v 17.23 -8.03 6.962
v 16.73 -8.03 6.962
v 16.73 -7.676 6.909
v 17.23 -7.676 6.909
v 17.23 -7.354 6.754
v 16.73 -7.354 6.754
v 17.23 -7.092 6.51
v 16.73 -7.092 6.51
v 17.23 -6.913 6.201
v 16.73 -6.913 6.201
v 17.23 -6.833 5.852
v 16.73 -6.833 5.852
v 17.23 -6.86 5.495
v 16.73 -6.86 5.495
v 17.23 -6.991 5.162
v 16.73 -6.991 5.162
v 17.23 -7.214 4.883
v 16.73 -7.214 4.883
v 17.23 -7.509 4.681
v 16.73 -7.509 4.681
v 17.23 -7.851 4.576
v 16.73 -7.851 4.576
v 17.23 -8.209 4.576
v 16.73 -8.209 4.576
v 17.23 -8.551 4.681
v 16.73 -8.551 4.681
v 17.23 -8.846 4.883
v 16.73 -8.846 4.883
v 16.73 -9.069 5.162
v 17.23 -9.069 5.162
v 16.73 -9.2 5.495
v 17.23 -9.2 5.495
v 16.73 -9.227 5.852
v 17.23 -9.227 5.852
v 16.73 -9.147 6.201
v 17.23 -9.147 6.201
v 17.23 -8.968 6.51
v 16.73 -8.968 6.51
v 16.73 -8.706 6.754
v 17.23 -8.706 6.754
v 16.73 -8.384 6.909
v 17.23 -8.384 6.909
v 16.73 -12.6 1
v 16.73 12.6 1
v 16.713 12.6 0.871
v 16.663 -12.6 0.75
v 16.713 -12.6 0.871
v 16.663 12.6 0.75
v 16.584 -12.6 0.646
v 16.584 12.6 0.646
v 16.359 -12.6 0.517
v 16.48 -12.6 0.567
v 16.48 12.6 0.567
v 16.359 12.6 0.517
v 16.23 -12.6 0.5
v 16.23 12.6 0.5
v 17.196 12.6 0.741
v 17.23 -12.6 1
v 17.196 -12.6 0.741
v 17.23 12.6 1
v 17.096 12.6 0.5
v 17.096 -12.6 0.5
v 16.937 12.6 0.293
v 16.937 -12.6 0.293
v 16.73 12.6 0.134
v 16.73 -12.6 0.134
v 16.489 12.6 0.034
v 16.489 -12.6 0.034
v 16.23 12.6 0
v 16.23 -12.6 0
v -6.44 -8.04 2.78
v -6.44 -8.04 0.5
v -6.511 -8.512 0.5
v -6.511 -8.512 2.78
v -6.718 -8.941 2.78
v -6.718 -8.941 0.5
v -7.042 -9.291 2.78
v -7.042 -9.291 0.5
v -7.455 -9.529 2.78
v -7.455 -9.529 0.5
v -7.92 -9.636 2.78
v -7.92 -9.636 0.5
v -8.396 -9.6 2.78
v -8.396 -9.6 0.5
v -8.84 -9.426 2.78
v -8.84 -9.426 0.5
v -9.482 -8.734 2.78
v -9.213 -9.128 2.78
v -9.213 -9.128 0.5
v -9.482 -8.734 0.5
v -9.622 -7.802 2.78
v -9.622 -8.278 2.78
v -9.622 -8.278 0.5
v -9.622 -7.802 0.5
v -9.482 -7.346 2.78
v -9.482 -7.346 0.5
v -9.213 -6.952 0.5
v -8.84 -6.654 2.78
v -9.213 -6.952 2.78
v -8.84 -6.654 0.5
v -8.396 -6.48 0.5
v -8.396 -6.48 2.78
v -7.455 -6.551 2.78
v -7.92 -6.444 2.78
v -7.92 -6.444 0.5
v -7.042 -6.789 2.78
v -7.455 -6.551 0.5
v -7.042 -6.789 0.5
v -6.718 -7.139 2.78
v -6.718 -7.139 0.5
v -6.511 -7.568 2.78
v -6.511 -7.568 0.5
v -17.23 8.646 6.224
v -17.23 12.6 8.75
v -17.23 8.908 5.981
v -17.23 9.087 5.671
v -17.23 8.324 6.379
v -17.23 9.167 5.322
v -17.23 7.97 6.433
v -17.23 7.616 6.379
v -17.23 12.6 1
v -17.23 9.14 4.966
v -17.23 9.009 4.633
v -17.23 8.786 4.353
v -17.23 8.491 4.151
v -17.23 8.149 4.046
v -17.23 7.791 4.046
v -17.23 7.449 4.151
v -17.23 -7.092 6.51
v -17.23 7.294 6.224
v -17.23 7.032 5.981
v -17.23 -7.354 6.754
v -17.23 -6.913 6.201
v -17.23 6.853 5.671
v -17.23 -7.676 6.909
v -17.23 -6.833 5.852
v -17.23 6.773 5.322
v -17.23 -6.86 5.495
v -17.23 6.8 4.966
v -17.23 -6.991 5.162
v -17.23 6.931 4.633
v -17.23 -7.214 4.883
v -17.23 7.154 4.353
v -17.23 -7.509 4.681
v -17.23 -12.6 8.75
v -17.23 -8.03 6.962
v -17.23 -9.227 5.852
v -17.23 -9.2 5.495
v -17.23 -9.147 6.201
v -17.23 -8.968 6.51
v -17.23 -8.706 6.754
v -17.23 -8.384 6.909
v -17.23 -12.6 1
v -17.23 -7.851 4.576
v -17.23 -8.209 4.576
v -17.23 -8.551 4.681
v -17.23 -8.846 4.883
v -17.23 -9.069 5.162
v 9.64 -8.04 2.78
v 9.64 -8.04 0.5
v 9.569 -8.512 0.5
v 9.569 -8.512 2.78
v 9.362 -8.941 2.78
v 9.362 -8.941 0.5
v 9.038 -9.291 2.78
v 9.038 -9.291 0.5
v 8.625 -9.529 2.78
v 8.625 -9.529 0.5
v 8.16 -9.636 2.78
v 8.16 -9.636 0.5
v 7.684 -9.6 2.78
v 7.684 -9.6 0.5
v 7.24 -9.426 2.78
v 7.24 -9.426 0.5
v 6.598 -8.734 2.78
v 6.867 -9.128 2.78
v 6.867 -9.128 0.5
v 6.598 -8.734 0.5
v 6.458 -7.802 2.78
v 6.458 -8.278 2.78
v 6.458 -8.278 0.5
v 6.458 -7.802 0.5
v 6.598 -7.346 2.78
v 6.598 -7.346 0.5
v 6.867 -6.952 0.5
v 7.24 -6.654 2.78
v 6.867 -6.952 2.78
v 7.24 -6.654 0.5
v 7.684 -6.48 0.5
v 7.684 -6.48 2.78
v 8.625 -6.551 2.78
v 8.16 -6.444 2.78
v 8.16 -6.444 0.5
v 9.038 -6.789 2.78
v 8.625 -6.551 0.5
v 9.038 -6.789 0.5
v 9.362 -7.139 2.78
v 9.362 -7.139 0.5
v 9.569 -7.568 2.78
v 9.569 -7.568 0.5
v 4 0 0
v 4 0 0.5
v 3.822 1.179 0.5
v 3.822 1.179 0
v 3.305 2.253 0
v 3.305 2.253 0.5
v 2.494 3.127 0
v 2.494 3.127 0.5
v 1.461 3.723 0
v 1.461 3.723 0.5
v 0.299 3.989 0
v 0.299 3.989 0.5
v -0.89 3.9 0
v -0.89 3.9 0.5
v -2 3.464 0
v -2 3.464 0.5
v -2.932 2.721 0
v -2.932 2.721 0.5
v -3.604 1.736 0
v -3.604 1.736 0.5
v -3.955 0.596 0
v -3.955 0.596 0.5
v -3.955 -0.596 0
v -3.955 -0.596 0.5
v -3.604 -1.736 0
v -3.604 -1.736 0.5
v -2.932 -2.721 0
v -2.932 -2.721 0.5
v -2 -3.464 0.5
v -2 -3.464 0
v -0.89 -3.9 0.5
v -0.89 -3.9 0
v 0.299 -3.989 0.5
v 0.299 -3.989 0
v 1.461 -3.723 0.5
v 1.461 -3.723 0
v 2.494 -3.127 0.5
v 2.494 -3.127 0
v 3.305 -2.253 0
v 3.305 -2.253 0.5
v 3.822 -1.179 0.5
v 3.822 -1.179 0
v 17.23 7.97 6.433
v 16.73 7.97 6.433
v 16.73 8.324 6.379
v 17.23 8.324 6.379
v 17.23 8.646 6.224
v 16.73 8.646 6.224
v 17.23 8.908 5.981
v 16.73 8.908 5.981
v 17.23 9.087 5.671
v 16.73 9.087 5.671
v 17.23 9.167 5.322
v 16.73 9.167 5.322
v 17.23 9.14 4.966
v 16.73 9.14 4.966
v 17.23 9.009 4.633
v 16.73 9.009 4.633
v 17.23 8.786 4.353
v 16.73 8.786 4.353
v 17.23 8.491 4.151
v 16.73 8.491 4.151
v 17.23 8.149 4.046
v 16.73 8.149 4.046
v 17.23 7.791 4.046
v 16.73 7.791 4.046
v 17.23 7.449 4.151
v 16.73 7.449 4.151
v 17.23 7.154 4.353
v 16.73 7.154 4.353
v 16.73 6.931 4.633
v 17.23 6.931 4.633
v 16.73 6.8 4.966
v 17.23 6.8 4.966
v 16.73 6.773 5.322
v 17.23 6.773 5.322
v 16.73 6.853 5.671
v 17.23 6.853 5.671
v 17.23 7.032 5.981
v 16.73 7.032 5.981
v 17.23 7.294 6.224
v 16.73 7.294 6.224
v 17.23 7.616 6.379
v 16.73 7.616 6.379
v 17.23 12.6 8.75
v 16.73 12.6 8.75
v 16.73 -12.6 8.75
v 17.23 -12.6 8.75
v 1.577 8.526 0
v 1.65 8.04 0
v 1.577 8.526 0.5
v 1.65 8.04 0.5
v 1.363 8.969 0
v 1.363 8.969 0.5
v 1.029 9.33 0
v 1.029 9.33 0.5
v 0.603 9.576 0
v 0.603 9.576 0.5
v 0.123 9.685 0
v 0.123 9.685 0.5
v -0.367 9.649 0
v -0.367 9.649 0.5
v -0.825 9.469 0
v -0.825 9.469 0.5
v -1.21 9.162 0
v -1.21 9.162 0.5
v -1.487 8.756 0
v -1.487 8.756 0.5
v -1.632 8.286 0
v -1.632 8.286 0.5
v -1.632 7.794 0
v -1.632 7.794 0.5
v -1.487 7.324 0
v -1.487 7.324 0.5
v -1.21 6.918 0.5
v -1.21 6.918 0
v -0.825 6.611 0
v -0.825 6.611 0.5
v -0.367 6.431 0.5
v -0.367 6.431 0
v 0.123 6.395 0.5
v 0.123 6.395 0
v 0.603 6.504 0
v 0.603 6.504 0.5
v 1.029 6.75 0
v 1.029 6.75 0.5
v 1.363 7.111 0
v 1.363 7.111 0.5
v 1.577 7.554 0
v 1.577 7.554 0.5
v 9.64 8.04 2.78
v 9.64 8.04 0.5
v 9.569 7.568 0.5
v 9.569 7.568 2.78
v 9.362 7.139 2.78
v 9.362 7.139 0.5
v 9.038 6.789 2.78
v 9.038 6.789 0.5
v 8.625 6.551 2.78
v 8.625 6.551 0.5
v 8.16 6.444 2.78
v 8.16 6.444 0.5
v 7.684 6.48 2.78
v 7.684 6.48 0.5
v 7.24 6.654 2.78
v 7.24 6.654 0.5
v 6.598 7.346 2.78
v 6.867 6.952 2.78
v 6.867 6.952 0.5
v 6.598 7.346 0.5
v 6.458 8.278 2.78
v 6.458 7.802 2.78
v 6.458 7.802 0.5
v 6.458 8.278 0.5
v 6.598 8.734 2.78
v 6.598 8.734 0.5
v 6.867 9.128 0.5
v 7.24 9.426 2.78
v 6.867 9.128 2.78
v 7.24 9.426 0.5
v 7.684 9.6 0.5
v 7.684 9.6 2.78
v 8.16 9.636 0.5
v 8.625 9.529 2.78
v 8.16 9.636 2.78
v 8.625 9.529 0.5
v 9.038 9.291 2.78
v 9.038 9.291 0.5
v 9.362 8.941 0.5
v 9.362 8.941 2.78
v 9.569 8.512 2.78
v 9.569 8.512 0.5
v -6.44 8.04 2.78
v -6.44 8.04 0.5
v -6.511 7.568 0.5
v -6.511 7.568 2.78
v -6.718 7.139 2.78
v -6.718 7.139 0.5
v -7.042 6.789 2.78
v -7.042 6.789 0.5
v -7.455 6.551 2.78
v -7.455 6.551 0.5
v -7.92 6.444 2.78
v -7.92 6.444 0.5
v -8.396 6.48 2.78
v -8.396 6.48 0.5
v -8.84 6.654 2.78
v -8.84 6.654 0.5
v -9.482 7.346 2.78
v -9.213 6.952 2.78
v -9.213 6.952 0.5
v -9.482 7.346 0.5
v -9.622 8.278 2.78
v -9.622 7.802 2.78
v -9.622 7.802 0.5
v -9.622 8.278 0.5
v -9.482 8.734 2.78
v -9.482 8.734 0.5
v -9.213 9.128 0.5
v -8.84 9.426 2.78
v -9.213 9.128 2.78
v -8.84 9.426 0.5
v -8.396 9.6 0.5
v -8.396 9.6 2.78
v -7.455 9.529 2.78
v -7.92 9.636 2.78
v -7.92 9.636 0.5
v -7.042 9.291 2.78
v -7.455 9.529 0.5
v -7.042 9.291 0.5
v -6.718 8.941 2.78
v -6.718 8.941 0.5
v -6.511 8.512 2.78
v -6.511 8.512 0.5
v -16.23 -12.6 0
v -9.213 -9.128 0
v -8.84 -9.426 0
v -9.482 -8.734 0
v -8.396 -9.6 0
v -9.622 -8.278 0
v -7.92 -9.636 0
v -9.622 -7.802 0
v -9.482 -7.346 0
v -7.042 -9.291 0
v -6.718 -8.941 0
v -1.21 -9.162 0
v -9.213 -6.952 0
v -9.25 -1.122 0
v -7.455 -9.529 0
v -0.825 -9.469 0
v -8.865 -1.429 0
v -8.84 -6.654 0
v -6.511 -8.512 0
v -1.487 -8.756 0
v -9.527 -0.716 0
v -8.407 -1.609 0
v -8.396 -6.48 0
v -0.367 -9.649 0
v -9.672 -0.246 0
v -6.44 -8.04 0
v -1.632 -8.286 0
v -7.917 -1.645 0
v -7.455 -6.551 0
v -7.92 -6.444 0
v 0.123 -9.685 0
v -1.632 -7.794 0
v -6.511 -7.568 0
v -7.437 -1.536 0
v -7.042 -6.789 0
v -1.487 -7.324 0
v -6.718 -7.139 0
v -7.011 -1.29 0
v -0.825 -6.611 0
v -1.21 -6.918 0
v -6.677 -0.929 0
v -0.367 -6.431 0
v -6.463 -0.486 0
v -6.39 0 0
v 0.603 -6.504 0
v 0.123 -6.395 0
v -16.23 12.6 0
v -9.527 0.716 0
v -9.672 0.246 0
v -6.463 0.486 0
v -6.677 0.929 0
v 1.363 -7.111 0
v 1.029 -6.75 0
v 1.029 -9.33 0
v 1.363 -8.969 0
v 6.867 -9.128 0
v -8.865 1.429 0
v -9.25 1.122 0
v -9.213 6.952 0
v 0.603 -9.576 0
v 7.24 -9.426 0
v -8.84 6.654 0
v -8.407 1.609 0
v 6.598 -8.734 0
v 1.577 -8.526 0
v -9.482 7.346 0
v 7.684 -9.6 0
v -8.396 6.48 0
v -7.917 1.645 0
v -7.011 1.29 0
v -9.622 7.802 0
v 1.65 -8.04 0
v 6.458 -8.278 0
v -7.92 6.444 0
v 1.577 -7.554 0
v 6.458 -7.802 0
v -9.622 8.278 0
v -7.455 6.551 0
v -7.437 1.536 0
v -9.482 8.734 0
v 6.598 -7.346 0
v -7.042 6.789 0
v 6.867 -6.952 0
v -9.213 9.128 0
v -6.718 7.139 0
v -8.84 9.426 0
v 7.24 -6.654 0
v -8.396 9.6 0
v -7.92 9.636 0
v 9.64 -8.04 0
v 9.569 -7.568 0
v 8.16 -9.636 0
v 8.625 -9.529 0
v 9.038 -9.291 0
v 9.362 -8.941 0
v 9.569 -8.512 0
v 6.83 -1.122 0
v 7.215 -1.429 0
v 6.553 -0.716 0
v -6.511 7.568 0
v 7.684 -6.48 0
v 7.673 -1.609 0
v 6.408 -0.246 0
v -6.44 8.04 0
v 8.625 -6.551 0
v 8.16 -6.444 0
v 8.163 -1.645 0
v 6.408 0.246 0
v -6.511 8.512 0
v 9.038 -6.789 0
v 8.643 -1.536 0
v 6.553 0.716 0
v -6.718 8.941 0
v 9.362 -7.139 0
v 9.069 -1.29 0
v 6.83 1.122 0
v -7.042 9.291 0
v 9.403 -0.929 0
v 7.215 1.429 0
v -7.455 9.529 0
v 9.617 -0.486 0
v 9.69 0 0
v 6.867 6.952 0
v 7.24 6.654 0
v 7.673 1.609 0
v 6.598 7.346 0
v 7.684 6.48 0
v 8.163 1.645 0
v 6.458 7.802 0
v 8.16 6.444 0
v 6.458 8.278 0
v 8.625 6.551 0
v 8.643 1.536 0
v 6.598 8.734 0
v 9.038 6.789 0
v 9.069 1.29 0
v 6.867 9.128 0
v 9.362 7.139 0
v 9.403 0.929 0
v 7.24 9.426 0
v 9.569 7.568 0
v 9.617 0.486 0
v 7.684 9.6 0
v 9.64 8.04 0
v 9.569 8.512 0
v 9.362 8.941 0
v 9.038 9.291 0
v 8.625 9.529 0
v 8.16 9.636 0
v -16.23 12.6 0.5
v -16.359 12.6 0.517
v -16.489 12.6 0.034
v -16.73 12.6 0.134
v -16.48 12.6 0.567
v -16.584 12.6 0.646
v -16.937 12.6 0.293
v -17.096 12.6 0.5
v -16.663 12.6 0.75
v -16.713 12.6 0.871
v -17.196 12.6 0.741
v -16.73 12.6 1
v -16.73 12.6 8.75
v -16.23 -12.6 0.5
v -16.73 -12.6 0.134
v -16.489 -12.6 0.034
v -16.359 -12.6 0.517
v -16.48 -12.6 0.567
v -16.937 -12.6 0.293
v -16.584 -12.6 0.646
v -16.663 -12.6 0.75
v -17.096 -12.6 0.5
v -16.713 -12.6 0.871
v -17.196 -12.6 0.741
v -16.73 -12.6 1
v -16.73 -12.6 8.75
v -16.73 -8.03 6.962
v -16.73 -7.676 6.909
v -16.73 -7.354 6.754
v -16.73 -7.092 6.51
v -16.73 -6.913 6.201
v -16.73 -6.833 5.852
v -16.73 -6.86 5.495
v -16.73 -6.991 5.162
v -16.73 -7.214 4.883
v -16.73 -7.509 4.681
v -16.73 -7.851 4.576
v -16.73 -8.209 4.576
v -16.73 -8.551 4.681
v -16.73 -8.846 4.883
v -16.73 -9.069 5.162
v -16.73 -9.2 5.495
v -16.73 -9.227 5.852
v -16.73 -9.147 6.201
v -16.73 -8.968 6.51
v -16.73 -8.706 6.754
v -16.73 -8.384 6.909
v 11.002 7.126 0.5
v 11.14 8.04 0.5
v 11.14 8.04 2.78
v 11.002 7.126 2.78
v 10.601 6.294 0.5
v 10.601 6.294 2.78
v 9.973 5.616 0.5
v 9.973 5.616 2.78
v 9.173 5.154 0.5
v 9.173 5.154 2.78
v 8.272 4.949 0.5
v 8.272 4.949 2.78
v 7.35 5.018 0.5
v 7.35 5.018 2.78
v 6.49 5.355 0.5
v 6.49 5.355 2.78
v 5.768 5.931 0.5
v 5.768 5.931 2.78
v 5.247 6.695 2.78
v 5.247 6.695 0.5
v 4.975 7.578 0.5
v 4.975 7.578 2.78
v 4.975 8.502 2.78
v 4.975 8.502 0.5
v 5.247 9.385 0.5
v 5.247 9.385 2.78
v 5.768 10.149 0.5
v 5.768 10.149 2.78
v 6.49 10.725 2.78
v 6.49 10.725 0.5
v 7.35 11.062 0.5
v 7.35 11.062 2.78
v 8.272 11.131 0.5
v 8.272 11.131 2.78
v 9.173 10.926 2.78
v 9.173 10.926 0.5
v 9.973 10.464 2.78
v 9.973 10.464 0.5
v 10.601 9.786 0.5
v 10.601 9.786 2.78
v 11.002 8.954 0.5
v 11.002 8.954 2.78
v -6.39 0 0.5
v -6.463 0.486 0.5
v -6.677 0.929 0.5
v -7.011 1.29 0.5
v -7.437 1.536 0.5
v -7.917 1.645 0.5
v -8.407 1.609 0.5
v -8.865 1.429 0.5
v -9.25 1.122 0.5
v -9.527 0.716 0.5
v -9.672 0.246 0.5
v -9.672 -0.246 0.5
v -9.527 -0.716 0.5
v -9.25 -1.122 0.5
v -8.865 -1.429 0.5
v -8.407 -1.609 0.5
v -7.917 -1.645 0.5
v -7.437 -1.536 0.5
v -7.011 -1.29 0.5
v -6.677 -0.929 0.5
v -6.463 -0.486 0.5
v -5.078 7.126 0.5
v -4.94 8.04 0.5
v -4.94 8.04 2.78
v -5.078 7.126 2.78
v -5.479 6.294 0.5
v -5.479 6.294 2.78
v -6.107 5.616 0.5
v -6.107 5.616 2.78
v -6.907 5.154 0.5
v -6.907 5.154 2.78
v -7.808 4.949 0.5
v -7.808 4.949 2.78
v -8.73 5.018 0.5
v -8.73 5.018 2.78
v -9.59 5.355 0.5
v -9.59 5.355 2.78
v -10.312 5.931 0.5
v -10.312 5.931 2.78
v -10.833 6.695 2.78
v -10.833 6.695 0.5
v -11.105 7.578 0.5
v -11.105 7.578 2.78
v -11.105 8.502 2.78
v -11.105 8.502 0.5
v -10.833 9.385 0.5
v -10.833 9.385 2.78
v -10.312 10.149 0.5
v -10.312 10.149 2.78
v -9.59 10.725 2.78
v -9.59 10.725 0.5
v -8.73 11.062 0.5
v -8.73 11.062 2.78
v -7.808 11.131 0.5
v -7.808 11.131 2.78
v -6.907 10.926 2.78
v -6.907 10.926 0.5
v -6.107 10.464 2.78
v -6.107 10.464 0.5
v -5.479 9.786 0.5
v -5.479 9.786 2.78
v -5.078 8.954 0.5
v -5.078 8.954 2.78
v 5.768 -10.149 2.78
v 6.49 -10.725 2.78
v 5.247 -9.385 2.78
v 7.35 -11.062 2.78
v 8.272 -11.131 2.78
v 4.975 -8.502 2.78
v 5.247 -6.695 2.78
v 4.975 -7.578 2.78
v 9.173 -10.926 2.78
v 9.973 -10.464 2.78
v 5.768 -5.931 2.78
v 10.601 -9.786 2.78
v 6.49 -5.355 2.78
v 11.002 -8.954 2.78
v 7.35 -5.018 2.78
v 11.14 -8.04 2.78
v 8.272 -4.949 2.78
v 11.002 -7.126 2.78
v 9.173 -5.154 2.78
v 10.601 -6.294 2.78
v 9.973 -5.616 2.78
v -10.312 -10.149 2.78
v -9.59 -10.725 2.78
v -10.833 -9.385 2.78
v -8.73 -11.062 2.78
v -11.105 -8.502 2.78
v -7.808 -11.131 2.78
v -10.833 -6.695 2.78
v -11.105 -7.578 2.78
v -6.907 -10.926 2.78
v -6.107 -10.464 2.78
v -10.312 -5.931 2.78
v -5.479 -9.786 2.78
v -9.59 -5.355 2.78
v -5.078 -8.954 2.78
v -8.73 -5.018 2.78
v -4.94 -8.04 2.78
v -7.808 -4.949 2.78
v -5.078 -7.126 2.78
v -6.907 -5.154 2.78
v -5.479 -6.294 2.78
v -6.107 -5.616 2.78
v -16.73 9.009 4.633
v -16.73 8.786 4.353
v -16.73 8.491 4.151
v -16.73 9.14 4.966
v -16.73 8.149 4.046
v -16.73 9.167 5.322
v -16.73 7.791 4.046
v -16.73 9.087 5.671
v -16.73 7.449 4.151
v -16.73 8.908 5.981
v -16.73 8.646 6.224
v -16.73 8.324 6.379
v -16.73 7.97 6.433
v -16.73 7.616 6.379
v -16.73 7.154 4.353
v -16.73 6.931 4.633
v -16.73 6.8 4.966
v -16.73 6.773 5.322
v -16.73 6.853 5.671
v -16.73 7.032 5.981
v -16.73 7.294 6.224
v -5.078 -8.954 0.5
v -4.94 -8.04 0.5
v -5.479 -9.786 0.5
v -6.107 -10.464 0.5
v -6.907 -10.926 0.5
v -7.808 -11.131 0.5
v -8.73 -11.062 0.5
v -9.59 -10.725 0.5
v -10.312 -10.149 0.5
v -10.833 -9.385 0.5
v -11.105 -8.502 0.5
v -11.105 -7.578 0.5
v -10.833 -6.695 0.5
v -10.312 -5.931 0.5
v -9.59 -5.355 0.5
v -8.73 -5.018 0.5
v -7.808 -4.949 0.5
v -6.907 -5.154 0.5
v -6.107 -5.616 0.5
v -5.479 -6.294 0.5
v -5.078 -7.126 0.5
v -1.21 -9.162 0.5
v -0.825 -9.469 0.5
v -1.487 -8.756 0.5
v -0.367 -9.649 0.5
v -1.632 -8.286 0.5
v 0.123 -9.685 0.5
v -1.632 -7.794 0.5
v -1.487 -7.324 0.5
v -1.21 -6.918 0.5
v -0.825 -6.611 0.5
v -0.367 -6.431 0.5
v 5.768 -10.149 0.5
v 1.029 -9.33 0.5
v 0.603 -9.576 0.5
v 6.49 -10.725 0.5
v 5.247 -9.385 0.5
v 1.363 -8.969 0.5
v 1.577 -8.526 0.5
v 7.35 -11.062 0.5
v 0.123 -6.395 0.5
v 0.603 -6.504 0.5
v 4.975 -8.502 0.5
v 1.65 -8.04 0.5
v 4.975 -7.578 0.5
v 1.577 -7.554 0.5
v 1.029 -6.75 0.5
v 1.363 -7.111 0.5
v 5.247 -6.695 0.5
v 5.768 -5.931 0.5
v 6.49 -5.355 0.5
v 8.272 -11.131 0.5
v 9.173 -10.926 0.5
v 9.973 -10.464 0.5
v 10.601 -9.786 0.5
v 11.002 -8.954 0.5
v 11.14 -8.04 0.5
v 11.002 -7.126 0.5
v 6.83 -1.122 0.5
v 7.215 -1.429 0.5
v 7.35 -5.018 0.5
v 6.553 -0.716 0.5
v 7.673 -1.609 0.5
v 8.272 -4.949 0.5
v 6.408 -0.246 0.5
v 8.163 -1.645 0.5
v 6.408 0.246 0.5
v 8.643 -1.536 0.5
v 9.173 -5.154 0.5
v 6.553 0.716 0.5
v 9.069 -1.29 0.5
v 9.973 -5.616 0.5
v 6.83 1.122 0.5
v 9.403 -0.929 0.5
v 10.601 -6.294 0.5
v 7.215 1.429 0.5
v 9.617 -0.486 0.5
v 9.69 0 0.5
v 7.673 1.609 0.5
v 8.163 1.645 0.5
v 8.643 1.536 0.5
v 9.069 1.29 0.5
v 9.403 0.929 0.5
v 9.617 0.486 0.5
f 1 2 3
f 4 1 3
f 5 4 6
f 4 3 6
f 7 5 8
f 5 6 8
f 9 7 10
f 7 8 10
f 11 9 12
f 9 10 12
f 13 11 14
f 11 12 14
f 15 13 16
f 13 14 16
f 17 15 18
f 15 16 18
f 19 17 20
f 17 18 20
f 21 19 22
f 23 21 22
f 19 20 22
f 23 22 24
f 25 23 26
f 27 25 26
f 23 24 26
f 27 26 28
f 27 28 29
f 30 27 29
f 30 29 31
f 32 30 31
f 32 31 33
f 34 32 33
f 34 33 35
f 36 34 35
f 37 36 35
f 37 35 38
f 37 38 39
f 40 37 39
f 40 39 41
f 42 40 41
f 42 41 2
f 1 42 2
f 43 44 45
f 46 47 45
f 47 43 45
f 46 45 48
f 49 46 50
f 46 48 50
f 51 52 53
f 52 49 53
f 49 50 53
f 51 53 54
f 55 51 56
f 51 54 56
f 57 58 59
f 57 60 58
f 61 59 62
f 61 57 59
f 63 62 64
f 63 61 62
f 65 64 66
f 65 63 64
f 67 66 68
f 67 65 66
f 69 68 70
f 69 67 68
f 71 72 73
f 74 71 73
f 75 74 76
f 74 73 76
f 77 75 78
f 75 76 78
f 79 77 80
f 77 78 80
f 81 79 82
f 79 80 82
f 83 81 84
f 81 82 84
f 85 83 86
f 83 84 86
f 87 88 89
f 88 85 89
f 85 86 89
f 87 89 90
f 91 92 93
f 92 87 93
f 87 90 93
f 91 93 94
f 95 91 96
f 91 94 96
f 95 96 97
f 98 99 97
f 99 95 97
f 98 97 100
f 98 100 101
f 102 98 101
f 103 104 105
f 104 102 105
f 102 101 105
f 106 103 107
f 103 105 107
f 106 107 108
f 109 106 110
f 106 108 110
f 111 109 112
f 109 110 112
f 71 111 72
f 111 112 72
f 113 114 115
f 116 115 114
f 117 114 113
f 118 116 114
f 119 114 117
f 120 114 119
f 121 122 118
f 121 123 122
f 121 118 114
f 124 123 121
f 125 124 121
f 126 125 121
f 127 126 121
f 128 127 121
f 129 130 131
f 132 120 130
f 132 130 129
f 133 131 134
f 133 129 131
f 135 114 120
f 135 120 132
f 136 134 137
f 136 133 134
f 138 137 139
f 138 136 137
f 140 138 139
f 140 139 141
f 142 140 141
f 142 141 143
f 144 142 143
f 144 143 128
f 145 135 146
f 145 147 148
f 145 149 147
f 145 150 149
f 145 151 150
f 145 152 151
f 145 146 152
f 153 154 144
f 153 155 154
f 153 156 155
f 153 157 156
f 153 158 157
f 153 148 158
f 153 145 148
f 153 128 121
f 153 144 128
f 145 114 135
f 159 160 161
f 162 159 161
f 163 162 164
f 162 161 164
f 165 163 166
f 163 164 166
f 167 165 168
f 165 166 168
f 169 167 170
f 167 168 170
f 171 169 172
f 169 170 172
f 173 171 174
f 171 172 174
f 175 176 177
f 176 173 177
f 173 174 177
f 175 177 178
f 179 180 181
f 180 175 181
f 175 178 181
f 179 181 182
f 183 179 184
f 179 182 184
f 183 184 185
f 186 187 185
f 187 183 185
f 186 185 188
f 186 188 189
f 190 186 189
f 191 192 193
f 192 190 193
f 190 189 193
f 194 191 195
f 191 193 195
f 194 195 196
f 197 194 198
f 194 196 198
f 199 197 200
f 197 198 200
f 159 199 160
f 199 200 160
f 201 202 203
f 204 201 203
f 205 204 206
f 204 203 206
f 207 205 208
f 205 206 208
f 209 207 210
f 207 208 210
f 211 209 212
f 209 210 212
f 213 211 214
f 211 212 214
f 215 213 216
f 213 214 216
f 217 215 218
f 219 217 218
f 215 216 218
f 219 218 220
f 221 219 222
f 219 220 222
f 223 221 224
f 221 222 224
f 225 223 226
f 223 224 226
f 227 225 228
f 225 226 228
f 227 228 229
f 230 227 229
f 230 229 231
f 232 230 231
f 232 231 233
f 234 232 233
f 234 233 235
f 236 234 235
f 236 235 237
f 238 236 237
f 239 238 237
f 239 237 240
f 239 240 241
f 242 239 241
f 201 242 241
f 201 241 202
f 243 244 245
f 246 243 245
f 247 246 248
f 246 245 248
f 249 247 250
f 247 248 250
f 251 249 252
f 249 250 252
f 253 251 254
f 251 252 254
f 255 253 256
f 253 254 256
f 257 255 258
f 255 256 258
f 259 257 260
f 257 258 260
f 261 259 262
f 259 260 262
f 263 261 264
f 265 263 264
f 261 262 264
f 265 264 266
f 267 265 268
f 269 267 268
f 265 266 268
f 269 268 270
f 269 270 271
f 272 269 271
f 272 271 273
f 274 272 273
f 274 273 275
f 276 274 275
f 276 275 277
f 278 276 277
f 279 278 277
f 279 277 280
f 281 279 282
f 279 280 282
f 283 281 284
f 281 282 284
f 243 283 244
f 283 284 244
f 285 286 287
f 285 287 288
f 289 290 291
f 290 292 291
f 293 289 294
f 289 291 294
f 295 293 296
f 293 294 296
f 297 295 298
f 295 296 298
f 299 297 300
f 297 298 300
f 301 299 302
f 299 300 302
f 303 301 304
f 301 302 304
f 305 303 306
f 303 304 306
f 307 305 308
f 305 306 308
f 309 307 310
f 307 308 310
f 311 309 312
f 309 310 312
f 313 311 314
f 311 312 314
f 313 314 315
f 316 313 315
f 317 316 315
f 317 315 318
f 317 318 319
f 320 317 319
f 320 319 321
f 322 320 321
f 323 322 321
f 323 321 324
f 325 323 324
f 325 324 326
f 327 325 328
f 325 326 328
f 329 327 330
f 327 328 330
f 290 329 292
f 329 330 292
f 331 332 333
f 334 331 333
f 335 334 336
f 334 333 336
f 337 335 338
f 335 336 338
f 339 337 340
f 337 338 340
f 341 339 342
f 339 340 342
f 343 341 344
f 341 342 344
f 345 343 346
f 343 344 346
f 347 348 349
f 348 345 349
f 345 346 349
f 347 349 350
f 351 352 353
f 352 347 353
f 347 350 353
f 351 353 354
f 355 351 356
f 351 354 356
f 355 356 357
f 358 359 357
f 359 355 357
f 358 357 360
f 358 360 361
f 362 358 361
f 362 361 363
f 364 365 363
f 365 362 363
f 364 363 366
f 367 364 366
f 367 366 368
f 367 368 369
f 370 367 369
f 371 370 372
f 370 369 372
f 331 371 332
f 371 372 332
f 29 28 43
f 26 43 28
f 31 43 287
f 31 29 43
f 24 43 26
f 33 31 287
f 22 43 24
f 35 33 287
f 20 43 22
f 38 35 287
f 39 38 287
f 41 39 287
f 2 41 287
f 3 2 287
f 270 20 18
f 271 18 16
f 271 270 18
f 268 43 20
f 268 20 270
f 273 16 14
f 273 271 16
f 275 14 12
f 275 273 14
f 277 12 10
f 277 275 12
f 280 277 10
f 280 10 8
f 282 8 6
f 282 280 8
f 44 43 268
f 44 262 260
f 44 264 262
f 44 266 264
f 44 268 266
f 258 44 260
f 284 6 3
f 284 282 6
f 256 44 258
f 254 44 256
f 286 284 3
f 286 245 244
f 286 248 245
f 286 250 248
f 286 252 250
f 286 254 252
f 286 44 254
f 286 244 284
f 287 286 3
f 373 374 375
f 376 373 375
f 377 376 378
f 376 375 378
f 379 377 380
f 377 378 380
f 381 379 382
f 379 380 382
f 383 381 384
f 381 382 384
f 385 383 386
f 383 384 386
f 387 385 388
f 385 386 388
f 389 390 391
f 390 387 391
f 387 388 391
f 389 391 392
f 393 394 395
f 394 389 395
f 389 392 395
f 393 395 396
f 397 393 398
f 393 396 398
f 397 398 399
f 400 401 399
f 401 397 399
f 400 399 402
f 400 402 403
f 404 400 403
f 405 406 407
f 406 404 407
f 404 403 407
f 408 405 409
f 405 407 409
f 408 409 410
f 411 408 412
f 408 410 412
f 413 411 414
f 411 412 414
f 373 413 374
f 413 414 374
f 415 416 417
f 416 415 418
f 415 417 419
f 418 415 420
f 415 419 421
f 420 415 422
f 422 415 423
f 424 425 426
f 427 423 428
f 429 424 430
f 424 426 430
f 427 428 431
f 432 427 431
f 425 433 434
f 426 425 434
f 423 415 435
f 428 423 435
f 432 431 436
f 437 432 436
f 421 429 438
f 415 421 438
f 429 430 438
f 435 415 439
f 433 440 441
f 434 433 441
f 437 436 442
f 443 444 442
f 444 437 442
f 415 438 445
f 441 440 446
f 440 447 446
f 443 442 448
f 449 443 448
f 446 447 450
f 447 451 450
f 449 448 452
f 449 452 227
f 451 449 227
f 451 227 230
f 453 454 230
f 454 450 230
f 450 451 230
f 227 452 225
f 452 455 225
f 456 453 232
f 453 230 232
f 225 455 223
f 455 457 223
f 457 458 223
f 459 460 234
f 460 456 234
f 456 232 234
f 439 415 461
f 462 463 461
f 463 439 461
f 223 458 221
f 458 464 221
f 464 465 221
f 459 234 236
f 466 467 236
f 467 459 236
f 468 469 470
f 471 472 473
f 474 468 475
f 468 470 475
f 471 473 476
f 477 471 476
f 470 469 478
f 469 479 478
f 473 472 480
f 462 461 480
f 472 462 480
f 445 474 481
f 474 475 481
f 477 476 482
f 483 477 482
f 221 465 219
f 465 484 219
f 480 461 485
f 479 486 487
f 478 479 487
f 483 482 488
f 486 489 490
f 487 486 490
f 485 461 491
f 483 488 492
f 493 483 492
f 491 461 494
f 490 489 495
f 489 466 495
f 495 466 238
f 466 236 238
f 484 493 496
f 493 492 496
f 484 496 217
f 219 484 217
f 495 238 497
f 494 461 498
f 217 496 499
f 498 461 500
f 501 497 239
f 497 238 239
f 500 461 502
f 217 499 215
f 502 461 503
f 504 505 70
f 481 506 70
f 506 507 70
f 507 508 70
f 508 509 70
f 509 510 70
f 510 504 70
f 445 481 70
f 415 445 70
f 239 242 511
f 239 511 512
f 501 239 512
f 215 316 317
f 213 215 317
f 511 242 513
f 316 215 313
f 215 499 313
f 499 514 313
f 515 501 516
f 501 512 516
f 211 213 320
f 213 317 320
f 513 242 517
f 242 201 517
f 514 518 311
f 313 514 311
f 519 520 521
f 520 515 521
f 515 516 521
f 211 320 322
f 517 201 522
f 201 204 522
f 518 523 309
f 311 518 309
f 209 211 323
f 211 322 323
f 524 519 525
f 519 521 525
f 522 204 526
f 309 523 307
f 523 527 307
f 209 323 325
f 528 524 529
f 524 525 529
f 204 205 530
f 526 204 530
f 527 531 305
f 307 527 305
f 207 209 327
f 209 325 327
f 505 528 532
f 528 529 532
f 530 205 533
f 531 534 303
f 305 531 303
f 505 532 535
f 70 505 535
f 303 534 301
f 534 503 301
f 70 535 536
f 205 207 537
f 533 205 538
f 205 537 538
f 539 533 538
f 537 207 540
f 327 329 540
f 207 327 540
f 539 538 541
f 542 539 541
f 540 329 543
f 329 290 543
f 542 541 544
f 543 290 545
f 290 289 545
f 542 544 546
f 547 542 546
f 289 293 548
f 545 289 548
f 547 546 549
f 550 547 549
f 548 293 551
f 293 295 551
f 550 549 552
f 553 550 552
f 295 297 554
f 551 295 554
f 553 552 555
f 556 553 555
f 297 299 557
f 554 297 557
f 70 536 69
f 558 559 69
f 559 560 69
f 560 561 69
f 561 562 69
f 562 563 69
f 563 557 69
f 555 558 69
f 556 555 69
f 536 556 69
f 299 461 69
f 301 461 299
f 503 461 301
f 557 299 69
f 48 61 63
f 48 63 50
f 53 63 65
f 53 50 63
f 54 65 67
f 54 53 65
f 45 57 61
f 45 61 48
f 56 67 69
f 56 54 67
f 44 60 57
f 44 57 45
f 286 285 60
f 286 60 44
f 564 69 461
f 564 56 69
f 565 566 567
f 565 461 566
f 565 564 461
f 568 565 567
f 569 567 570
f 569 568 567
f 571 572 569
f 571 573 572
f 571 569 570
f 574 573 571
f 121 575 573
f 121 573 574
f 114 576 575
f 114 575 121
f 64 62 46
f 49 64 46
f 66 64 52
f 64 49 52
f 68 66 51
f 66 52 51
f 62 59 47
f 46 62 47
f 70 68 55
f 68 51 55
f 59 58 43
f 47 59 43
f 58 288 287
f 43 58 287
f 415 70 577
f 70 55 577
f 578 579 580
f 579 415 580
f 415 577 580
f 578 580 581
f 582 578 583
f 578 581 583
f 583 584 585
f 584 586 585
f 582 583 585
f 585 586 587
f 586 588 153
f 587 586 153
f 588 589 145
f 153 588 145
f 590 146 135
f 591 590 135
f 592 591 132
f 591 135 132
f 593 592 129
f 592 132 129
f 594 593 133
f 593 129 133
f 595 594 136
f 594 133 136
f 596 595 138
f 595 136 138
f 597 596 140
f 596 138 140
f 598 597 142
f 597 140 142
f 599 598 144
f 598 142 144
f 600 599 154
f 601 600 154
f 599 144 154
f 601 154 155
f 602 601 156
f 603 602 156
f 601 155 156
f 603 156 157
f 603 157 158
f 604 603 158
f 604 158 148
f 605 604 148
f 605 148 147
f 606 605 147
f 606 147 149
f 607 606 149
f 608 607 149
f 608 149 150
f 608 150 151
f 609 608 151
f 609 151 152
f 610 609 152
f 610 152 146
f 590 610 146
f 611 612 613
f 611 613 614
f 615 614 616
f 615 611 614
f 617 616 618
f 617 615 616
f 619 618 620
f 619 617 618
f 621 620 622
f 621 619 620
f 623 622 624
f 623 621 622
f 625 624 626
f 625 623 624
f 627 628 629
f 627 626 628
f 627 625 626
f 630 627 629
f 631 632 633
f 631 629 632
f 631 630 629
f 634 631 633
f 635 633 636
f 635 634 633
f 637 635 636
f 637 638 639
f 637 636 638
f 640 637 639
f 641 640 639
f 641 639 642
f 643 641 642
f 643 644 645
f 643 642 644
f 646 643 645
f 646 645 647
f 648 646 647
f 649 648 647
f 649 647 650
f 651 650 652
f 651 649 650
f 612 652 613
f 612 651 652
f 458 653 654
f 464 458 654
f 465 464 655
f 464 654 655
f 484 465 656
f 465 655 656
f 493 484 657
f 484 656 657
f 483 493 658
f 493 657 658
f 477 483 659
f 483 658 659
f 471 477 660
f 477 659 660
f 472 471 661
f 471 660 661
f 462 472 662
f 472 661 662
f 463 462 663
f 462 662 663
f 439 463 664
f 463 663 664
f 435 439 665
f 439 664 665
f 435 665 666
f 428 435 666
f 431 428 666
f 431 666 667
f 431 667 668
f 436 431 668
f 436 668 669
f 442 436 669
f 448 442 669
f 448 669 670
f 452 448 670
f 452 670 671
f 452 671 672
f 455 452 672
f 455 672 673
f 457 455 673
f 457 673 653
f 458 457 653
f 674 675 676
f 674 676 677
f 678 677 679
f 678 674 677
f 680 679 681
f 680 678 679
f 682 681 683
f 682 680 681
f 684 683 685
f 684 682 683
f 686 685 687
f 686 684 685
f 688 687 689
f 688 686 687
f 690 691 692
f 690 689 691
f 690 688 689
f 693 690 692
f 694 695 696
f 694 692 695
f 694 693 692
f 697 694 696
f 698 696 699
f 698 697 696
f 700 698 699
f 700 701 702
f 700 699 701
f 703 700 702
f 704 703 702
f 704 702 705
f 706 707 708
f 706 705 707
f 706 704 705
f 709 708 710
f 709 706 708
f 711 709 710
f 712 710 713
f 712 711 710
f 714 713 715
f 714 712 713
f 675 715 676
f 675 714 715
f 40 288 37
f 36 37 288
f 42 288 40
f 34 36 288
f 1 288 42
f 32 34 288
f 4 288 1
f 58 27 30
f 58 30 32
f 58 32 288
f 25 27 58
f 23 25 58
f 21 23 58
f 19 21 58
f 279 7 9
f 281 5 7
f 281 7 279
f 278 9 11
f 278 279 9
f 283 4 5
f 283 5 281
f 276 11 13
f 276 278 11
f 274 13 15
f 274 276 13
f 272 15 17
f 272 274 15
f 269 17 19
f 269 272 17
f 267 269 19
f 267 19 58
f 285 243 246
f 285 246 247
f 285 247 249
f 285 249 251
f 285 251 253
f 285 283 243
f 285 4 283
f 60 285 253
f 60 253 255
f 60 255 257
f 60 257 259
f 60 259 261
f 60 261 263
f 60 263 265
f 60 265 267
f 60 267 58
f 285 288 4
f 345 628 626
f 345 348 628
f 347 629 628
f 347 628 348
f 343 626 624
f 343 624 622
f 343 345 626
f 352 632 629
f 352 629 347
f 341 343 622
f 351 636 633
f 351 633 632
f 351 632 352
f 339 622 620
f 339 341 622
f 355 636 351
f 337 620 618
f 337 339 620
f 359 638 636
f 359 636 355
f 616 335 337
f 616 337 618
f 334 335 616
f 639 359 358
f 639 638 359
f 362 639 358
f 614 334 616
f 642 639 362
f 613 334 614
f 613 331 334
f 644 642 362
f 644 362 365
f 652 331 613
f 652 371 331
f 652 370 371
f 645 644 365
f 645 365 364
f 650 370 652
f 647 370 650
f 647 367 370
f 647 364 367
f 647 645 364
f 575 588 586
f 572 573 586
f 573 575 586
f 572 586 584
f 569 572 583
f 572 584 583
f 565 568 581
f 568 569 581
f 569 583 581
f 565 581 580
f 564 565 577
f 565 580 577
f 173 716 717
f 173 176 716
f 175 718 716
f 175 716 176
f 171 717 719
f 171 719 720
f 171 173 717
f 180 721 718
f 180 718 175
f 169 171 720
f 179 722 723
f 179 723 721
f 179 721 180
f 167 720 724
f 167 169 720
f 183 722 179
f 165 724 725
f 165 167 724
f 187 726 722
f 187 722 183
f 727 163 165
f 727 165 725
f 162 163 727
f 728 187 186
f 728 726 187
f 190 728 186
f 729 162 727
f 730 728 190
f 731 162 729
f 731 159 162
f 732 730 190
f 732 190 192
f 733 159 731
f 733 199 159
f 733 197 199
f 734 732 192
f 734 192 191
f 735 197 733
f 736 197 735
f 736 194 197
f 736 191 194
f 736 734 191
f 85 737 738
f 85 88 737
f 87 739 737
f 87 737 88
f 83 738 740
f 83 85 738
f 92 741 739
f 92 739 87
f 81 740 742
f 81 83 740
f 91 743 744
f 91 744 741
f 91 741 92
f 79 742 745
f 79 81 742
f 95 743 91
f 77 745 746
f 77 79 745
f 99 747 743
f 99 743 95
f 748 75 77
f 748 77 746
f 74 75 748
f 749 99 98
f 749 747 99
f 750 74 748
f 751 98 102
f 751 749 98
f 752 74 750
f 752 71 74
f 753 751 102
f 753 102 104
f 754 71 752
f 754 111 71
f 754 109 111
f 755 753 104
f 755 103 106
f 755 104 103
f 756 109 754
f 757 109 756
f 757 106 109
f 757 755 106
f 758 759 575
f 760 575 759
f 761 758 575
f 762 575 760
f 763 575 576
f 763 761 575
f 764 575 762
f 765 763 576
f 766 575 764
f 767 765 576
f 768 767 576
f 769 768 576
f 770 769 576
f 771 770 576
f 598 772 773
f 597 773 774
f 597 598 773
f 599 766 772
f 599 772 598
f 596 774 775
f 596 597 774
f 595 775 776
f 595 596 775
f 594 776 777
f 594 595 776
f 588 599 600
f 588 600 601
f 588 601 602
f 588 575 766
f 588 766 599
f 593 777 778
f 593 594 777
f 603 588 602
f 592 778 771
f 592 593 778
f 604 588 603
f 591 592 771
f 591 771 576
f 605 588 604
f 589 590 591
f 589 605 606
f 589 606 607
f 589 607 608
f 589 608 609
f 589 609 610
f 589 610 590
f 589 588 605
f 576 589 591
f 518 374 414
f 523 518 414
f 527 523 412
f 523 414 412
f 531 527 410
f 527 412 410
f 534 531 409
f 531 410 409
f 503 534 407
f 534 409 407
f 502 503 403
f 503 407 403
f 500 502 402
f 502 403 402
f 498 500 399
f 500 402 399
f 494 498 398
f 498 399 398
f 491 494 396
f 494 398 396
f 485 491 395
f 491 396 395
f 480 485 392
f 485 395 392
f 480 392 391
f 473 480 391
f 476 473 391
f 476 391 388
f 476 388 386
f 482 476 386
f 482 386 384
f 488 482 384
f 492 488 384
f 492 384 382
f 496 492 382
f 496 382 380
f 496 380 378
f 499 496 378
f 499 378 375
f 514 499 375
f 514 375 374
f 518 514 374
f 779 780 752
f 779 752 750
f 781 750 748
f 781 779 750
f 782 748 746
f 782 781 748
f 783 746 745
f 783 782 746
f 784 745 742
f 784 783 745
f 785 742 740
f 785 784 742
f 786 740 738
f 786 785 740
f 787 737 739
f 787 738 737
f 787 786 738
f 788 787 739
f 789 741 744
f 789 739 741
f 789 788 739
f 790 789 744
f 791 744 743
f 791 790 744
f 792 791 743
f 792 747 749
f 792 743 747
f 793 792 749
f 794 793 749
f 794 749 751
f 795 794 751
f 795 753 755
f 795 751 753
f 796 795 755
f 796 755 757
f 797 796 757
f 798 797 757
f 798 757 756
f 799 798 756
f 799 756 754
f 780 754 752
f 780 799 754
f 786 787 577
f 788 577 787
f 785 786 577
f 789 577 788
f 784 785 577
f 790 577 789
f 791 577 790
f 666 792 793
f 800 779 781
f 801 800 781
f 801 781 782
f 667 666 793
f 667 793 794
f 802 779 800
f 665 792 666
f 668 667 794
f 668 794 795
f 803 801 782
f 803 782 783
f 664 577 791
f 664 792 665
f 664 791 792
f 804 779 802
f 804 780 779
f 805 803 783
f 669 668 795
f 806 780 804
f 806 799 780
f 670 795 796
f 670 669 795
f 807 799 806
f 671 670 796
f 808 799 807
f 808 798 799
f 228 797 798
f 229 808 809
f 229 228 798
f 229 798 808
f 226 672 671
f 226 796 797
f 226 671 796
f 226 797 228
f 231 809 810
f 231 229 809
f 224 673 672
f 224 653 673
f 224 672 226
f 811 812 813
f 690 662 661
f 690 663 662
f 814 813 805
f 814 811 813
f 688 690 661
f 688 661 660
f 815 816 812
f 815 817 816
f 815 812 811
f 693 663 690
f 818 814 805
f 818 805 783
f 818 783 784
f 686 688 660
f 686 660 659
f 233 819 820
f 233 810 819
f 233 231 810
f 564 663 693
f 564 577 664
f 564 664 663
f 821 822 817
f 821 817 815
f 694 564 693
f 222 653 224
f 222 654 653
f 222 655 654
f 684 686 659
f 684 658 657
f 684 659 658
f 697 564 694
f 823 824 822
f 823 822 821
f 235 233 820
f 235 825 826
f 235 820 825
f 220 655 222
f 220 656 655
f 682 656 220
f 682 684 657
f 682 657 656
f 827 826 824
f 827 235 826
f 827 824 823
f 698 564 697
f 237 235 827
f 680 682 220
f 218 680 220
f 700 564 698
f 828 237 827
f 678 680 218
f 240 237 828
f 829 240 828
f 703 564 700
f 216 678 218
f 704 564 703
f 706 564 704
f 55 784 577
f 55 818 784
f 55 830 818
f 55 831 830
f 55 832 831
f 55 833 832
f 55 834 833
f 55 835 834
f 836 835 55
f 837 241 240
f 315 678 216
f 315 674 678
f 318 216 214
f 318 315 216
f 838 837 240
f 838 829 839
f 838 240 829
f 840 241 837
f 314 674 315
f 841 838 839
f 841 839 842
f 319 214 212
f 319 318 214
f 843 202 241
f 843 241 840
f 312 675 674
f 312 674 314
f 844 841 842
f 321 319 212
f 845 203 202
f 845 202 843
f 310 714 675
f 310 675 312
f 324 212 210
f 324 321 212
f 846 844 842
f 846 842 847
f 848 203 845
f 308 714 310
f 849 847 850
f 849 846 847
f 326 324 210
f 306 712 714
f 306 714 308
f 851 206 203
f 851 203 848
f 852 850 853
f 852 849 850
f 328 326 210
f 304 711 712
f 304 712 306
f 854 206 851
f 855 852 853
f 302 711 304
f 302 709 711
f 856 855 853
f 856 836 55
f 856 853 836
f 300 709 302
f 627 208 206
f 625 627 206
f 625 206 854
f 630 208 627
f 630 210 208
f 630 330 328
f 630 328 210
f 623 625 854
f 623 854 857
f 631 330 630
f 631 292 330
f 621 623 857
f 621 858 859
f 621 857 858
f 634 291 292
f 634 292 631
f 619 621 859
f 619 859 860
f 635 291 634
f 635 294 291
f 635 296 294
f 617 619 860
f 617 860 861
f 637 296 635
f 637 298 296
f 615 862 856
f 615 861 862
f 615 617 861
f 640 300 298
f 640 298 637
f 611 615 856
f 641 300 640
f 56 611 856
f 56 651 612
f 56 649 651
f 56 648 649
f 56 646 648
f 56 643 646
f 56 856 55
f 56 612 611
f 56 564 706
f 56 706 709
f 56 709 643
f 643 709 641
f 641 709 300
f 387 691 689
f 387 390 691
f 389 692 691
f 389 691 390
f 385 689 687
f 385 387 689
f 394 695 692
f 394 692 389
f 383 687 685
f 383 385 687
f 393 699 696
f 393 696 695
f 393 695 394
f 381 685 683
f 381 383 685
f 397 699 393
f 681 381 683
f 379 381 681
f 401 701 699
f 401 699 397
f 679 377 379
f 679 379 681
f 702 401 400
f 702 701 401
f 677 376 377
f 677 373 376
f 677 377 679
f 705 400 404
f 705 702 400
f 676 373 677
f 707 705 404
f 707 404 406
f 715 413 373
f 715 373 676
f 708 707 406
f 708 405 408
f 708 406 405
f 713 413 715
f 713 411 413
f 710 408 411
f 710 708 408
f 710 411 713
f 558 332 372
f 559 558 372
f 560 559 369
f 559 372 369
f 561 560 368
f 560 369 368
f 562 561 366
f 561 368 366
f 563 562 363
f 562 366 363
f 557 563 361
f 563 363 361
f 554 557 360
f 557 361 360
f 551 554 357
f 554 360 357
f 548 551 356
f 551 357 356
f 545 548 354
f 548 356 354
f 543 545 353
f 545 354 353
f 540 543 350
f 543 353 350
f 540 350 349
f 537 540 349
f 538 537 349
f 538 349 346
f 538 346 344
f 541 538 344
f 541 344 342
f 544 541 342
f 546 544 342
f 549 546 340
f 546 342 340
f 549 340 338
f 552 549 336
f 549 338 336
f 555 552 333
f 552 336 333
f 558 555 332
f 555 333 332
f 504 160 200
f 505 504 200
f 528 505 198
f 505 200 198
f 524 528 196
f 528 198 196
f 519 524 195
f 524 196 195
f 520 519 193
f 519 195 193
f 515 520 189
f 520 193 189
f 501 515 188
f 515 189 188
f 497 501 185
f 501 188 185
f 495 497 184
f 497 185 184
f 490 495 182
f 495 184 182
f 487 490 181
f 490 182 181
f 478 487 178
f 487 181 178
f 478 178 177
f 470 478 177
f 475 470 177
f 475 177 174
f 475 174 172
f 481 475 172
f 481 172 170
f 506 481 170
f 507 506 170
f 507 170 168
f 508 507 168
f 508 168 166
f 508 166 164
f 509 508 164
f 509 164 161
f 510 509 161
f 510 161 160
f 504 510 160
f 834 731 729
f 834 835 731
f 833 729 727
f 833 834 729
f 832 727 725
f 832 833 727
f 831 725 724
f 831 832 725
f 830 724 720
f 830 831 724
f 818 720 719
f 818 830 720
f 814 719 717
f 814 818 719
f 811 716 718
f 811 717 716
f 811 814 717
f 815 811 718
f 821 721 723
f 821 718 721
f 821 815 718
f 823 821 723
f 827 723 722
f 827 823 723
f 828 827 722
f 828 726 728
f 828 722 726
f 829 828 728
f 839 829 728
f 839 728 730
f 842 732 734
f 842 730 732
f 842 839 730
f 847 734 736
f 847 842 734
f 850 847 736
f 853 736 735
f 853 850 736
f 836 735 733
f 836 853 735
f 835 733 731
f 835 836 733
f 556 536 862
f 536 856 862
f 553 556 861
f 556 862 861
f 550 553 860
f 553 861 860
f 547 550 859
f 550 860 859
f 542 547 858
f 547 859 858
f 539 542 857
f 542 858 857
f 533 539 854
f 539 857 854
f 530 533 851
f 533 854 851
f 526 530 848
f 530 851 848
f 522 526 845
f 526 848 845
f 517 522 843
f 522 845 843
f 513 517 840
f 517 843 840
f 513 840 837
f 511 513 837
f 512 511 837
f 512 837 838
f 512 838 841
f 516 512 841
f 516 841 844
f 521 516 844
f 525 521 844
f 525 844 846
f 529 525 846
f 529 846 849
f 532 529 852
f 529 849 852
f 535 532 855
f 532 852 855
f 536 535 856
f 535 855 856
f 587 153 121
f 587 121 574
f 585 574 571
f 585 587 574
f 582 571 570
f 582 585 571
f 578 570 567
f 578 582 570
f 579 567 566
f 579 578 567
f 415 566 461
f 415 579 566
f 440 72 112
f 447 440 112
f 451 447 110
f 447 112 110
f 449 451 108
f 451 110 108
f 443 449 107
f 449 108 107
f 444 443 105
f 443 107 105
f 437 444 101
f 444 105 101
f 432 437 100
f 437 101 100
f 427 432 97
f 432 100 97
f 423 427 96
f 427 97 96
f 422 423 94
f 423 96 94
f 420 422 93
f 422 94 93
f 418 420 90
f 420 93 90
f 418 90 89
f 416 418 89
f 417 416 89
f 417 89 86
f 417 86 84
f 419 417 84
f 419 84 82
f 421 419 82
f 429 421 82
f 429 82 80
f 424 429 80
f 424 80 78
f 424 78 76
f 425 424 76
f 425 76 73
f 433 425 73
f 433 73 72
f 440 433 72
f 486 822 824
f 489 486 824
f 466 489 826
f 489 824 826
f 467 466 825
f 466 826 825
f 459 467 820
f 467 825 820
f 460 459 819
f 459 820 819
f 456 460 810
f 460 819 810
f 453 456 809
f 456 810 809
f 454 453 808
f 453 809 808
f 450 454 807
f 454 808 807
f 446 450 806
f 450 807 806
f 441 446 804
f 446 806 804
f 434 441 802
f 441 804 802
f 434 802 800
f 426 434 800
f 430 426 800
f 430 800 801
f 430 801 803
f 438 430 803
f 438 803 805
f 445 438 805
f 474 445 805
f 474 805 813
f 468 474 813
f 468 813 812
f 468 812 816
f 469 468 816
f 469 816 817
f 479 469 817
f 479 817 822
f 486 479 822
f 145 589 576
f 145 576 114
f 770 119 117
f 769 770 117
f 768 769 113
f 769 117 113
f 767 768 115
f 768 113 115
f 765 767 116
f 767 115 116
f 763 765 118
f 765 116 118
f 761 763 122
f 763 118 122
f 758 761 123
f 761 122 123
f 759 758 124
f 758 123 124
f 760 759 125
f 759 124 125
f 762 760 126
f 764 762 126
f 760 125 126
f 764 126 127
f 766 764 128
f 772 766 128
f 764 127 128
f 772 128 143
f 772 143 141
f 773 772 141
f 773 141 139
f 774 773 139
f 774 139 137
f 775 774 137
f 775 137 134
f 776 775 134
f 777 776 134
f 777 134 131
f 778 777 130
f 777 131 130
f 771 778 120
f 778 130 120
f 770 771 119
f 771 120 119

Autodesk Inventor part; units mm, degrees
ref_plane "YZ Plane" through (0, 0, 0) normal (1, 0, 0) x (0, 1, 0)
ref_plane "XZ Plane" through (0, 0, 0) normal (0, 1, 0) x (-1, 0, 0)
ref_plane "XY Plane" through (0, 0, 0) normal (0, 0, 1) x (1, 0, 0)
sketch "Sketch1" plane through (0, 0, 0) normal (0, 0, 1) x (1, 0, 0)
  line L0 (-17.23, 12.6) -> (17.23, 12.6)
  line L1 (17.23, 12.6) -> (17.23, -12.6)
  line L2 (17.23, -12.6) -> (-17.23, -12.6)
  line L3 (-17.23, -12.6) -> (-17.23, 12.6)
  point P0 (0, 0)
  dimension "d0" = 17.23
  dimension "d1" = 34.46
  dimension "d2" = 12.6
  dimension "d3" = 25.2
extrude "Plate1" add sketch "Sketch1" along normal blind 0.5
sketch "Sketch4" plane through (-16.73, -12.6, 0) normal (-1, 0, 0) x (0, -1, 0)
  line L0 (-25.2, 0) -> (0, 0)
  line L1 (0, 0) -> (0, 8.75)
  line L2 (0, 8.75) -> (-25.2, 8.75)
  line L3 (-25.2, 8.75) -> (-25.2, 0)
edge flange "Flange1" height 8.75 angle 90 thickness 0.5 bend radius 0.5 thickness toward (-1, 0, 0) relief straight relief width 0.5 relief depth 0.25 edges at (-17.23, 0, 0.5) wall of the first edge with corners at (-16.73, 12.6, 0) (-16.73, -12.6, 0) (-16.73, -12.6, 8.75) (-16.73, 12.6, 8.75)
bend "Bend1"
corner "Corner1"
sketch "Sketch5" plane through (16.73, 12.6, 0) normal (1, 0, 0) x (0, 1, 0)
  line L0 (-25.2, 0) -> (0, 0)
  line L1 (0, 0) -> (0, 8.75)
  line L2 (0, 8.75) -> (-25.2, 8.75)
  line L3 (-25.2, 8.75) -> (-25.2, 0)
edge flange "Flange2" height 8.75 angle 90 thickness 0.5 bend radius 0.5 thickness toward (1, 0, 0) relief straight relief width 0.5 relief depth 0.25 edges at (17.23, 0, 0.5) wall of the first edge with corners at (16.73, -12.6, 0) (16.73, 12.6, 0) (16.73, 12.6, 8.75) (16.73, -12.6, 8.75)
bend "Bend2"
corner "Corner2"
sketch "Sketch6" plane through (0, 0, 0.5) normal (0, 0, 1) x (1, 0, 0)
  circle A0 centre (0, 0) radius 4
  circle A1 centre (0, 8.04) radius 1.65
  circle A2 centre (0, -8.04) radius 1.65
  circle A3 centre (8.04, 0) radius 1.65
  circle A4 centre (-8.04, 0) radius 1.65
  line L0 (16.23, -12.6) -> (-16.23, -12.6) projected
  line L1 (-16.23, 12.6) -> (16.23, 12.6) projected
  dimension "d26" = 3.3
  dimension "d27" = 8
  dimension "d29" = 4.56
  dimension "d30" = 4.56
  dimension "d31" = 8.04
  dimension "d32" = 8.04
  dimension "d33" = 8.04
extrude "Extrusion1" cut sketch "Sketch6" against normal through all
sketch "Sketch7" plane through (0, 0, 0.5) normal (0, 0, 1) x (1, 0, 0)
  circle A0 centre (0, 8.04) radius 1.65 projected
  circle A1 centre (-8.04, 0) radius 1.65 projected
  circle A2 centre (-8.04, 8.04) radius 1.6
  line L0 (0, -17.64) -> (0, 17.64) projected
  line L1 (-24.122, 0) -> (24.122, 0) projected
  circle A3 centre (8.04, 8.04) radius 1.6
  circle A4 centre (-8.04, -8.04) radius 1.6
  circle A5 centre (8.04, -8.04) radius 1.6
  point P0 (0, 0)
  dimension "d36" = 3.2
extrude "Extrusion2" cut sketch "Sketch7" against normal through all contours A2 | A3 | A4 | A5
sketch "Sketch8" plane through (0, 0, 0.5) normal (0, 0, 1) x (1, 0, 0)
  circle A0 centre (-8.04, 8.04) radius 1.6 projected
  circle A1 centre (8.04, 8.04) radius 1.6 projected
  circle A2 centre (8.04, -8.04) radius 1.6 projected
  circle A3 centre (-8.04, -8.04) radius 1.6 projected
  circle A4 centre (-8.04, 8.04) radius 3.1
  circle A5 centre (8.04, 8.04) radius 3.1
  circle A6 centre (8.04, -8.04) radius 3.1
  circle A7 centre (-8.04, -8.04) radius 3.1
  point P0 (0, 0)
  dimension "d39" = 6.2
extrude "Extrusion3" add sketch "Sketch8" along normal blind 2.28
thread "Thread1" size "M3.5x0.6" class "6H" standard "ANSI Metric M Profile" full length
thread "Thread2" size "M3.5x0.6" class "6H" standard "ANSI Metric M Profile" full length
thread "Thread3" size "M3.5x0.6" class "6H" standard "ANSI Metric M Profile" full length
thread "Thread4" size "M3.5x0.6" class "6H" standard "ANSI Metric M Profile" full length
sketch "Sketch9" plane through (-17.23, -12.6, 8.75) normal (-1, 0, 0) x (0, 0, 1)
  circle A0 centre (-3.5174, 20.57) radius 1.2
  circle A1 centre (-2.9878, 4.57) radius 1.2
  line L0 (-7.75, 25.2) -> (0, 25.2) projected
  point P0 (-8.75, 12.6)
  dimension "d50" = 2.4
  dimension "d51" = 16
  dimension "d52" = 4.63
extrude "Extrusion4" cut sketch "Sketch9" against normal through all
equation "\"d30\" = d29"
equation "\"d6\" = BendReliefWidth"
equation "\"d7\" = BendReliefDepth"
equation "\"d8\" = MinimumRemnant"
equation "\"d9\" = BendRadius"
equation "\"d12\" = BendRadius"
equation "\"d13\" = CornerReliefSize"
equation "\"d14\" = GapSize"
equation "\"d15\" = JacobiRadiusSize"
equation "\"d16\" = BendReliefWidth"
equation "\"d17\" = BendReliefDepth"
equation "\"d18\" = MinimumRemnant"
equation "\"d19\" = BendRadius"
equation "\"d22\" = BendRadius"
equation "\"d23\" = CornerReliefSize"
equation "\"d24\" = GapSize"
equation "\"d25\" = JacobiRadiusSize"
equation "\"d32\" = d31"
equation "\"d33\" = d32"
equation "\"d0\" = 0.5 * d1"
equation "\"d2\" = 0.5 * d3"
equation "\"BendRadius\" = Thickness"
equation "\"BendReliefWidth\" = Thickness"
equation "\"BendReliefDepth\" = 0.5 * Thickness"
equation "\"CornerReliefSize\" = 4 * Thickness"
equation "\"MinimumRemnant\" = 2 * Thickness"
equation "\"TransitionRadius\" = BendRadius"
equation "\"JacobiRadiusSize\" = Thickness"
equation "\"GapSize\" = Thickness"
equation "\"d4\" = BendRadius"
equation "\"Thickness\" = 0.5"
properties part number "Servo Bracket"
